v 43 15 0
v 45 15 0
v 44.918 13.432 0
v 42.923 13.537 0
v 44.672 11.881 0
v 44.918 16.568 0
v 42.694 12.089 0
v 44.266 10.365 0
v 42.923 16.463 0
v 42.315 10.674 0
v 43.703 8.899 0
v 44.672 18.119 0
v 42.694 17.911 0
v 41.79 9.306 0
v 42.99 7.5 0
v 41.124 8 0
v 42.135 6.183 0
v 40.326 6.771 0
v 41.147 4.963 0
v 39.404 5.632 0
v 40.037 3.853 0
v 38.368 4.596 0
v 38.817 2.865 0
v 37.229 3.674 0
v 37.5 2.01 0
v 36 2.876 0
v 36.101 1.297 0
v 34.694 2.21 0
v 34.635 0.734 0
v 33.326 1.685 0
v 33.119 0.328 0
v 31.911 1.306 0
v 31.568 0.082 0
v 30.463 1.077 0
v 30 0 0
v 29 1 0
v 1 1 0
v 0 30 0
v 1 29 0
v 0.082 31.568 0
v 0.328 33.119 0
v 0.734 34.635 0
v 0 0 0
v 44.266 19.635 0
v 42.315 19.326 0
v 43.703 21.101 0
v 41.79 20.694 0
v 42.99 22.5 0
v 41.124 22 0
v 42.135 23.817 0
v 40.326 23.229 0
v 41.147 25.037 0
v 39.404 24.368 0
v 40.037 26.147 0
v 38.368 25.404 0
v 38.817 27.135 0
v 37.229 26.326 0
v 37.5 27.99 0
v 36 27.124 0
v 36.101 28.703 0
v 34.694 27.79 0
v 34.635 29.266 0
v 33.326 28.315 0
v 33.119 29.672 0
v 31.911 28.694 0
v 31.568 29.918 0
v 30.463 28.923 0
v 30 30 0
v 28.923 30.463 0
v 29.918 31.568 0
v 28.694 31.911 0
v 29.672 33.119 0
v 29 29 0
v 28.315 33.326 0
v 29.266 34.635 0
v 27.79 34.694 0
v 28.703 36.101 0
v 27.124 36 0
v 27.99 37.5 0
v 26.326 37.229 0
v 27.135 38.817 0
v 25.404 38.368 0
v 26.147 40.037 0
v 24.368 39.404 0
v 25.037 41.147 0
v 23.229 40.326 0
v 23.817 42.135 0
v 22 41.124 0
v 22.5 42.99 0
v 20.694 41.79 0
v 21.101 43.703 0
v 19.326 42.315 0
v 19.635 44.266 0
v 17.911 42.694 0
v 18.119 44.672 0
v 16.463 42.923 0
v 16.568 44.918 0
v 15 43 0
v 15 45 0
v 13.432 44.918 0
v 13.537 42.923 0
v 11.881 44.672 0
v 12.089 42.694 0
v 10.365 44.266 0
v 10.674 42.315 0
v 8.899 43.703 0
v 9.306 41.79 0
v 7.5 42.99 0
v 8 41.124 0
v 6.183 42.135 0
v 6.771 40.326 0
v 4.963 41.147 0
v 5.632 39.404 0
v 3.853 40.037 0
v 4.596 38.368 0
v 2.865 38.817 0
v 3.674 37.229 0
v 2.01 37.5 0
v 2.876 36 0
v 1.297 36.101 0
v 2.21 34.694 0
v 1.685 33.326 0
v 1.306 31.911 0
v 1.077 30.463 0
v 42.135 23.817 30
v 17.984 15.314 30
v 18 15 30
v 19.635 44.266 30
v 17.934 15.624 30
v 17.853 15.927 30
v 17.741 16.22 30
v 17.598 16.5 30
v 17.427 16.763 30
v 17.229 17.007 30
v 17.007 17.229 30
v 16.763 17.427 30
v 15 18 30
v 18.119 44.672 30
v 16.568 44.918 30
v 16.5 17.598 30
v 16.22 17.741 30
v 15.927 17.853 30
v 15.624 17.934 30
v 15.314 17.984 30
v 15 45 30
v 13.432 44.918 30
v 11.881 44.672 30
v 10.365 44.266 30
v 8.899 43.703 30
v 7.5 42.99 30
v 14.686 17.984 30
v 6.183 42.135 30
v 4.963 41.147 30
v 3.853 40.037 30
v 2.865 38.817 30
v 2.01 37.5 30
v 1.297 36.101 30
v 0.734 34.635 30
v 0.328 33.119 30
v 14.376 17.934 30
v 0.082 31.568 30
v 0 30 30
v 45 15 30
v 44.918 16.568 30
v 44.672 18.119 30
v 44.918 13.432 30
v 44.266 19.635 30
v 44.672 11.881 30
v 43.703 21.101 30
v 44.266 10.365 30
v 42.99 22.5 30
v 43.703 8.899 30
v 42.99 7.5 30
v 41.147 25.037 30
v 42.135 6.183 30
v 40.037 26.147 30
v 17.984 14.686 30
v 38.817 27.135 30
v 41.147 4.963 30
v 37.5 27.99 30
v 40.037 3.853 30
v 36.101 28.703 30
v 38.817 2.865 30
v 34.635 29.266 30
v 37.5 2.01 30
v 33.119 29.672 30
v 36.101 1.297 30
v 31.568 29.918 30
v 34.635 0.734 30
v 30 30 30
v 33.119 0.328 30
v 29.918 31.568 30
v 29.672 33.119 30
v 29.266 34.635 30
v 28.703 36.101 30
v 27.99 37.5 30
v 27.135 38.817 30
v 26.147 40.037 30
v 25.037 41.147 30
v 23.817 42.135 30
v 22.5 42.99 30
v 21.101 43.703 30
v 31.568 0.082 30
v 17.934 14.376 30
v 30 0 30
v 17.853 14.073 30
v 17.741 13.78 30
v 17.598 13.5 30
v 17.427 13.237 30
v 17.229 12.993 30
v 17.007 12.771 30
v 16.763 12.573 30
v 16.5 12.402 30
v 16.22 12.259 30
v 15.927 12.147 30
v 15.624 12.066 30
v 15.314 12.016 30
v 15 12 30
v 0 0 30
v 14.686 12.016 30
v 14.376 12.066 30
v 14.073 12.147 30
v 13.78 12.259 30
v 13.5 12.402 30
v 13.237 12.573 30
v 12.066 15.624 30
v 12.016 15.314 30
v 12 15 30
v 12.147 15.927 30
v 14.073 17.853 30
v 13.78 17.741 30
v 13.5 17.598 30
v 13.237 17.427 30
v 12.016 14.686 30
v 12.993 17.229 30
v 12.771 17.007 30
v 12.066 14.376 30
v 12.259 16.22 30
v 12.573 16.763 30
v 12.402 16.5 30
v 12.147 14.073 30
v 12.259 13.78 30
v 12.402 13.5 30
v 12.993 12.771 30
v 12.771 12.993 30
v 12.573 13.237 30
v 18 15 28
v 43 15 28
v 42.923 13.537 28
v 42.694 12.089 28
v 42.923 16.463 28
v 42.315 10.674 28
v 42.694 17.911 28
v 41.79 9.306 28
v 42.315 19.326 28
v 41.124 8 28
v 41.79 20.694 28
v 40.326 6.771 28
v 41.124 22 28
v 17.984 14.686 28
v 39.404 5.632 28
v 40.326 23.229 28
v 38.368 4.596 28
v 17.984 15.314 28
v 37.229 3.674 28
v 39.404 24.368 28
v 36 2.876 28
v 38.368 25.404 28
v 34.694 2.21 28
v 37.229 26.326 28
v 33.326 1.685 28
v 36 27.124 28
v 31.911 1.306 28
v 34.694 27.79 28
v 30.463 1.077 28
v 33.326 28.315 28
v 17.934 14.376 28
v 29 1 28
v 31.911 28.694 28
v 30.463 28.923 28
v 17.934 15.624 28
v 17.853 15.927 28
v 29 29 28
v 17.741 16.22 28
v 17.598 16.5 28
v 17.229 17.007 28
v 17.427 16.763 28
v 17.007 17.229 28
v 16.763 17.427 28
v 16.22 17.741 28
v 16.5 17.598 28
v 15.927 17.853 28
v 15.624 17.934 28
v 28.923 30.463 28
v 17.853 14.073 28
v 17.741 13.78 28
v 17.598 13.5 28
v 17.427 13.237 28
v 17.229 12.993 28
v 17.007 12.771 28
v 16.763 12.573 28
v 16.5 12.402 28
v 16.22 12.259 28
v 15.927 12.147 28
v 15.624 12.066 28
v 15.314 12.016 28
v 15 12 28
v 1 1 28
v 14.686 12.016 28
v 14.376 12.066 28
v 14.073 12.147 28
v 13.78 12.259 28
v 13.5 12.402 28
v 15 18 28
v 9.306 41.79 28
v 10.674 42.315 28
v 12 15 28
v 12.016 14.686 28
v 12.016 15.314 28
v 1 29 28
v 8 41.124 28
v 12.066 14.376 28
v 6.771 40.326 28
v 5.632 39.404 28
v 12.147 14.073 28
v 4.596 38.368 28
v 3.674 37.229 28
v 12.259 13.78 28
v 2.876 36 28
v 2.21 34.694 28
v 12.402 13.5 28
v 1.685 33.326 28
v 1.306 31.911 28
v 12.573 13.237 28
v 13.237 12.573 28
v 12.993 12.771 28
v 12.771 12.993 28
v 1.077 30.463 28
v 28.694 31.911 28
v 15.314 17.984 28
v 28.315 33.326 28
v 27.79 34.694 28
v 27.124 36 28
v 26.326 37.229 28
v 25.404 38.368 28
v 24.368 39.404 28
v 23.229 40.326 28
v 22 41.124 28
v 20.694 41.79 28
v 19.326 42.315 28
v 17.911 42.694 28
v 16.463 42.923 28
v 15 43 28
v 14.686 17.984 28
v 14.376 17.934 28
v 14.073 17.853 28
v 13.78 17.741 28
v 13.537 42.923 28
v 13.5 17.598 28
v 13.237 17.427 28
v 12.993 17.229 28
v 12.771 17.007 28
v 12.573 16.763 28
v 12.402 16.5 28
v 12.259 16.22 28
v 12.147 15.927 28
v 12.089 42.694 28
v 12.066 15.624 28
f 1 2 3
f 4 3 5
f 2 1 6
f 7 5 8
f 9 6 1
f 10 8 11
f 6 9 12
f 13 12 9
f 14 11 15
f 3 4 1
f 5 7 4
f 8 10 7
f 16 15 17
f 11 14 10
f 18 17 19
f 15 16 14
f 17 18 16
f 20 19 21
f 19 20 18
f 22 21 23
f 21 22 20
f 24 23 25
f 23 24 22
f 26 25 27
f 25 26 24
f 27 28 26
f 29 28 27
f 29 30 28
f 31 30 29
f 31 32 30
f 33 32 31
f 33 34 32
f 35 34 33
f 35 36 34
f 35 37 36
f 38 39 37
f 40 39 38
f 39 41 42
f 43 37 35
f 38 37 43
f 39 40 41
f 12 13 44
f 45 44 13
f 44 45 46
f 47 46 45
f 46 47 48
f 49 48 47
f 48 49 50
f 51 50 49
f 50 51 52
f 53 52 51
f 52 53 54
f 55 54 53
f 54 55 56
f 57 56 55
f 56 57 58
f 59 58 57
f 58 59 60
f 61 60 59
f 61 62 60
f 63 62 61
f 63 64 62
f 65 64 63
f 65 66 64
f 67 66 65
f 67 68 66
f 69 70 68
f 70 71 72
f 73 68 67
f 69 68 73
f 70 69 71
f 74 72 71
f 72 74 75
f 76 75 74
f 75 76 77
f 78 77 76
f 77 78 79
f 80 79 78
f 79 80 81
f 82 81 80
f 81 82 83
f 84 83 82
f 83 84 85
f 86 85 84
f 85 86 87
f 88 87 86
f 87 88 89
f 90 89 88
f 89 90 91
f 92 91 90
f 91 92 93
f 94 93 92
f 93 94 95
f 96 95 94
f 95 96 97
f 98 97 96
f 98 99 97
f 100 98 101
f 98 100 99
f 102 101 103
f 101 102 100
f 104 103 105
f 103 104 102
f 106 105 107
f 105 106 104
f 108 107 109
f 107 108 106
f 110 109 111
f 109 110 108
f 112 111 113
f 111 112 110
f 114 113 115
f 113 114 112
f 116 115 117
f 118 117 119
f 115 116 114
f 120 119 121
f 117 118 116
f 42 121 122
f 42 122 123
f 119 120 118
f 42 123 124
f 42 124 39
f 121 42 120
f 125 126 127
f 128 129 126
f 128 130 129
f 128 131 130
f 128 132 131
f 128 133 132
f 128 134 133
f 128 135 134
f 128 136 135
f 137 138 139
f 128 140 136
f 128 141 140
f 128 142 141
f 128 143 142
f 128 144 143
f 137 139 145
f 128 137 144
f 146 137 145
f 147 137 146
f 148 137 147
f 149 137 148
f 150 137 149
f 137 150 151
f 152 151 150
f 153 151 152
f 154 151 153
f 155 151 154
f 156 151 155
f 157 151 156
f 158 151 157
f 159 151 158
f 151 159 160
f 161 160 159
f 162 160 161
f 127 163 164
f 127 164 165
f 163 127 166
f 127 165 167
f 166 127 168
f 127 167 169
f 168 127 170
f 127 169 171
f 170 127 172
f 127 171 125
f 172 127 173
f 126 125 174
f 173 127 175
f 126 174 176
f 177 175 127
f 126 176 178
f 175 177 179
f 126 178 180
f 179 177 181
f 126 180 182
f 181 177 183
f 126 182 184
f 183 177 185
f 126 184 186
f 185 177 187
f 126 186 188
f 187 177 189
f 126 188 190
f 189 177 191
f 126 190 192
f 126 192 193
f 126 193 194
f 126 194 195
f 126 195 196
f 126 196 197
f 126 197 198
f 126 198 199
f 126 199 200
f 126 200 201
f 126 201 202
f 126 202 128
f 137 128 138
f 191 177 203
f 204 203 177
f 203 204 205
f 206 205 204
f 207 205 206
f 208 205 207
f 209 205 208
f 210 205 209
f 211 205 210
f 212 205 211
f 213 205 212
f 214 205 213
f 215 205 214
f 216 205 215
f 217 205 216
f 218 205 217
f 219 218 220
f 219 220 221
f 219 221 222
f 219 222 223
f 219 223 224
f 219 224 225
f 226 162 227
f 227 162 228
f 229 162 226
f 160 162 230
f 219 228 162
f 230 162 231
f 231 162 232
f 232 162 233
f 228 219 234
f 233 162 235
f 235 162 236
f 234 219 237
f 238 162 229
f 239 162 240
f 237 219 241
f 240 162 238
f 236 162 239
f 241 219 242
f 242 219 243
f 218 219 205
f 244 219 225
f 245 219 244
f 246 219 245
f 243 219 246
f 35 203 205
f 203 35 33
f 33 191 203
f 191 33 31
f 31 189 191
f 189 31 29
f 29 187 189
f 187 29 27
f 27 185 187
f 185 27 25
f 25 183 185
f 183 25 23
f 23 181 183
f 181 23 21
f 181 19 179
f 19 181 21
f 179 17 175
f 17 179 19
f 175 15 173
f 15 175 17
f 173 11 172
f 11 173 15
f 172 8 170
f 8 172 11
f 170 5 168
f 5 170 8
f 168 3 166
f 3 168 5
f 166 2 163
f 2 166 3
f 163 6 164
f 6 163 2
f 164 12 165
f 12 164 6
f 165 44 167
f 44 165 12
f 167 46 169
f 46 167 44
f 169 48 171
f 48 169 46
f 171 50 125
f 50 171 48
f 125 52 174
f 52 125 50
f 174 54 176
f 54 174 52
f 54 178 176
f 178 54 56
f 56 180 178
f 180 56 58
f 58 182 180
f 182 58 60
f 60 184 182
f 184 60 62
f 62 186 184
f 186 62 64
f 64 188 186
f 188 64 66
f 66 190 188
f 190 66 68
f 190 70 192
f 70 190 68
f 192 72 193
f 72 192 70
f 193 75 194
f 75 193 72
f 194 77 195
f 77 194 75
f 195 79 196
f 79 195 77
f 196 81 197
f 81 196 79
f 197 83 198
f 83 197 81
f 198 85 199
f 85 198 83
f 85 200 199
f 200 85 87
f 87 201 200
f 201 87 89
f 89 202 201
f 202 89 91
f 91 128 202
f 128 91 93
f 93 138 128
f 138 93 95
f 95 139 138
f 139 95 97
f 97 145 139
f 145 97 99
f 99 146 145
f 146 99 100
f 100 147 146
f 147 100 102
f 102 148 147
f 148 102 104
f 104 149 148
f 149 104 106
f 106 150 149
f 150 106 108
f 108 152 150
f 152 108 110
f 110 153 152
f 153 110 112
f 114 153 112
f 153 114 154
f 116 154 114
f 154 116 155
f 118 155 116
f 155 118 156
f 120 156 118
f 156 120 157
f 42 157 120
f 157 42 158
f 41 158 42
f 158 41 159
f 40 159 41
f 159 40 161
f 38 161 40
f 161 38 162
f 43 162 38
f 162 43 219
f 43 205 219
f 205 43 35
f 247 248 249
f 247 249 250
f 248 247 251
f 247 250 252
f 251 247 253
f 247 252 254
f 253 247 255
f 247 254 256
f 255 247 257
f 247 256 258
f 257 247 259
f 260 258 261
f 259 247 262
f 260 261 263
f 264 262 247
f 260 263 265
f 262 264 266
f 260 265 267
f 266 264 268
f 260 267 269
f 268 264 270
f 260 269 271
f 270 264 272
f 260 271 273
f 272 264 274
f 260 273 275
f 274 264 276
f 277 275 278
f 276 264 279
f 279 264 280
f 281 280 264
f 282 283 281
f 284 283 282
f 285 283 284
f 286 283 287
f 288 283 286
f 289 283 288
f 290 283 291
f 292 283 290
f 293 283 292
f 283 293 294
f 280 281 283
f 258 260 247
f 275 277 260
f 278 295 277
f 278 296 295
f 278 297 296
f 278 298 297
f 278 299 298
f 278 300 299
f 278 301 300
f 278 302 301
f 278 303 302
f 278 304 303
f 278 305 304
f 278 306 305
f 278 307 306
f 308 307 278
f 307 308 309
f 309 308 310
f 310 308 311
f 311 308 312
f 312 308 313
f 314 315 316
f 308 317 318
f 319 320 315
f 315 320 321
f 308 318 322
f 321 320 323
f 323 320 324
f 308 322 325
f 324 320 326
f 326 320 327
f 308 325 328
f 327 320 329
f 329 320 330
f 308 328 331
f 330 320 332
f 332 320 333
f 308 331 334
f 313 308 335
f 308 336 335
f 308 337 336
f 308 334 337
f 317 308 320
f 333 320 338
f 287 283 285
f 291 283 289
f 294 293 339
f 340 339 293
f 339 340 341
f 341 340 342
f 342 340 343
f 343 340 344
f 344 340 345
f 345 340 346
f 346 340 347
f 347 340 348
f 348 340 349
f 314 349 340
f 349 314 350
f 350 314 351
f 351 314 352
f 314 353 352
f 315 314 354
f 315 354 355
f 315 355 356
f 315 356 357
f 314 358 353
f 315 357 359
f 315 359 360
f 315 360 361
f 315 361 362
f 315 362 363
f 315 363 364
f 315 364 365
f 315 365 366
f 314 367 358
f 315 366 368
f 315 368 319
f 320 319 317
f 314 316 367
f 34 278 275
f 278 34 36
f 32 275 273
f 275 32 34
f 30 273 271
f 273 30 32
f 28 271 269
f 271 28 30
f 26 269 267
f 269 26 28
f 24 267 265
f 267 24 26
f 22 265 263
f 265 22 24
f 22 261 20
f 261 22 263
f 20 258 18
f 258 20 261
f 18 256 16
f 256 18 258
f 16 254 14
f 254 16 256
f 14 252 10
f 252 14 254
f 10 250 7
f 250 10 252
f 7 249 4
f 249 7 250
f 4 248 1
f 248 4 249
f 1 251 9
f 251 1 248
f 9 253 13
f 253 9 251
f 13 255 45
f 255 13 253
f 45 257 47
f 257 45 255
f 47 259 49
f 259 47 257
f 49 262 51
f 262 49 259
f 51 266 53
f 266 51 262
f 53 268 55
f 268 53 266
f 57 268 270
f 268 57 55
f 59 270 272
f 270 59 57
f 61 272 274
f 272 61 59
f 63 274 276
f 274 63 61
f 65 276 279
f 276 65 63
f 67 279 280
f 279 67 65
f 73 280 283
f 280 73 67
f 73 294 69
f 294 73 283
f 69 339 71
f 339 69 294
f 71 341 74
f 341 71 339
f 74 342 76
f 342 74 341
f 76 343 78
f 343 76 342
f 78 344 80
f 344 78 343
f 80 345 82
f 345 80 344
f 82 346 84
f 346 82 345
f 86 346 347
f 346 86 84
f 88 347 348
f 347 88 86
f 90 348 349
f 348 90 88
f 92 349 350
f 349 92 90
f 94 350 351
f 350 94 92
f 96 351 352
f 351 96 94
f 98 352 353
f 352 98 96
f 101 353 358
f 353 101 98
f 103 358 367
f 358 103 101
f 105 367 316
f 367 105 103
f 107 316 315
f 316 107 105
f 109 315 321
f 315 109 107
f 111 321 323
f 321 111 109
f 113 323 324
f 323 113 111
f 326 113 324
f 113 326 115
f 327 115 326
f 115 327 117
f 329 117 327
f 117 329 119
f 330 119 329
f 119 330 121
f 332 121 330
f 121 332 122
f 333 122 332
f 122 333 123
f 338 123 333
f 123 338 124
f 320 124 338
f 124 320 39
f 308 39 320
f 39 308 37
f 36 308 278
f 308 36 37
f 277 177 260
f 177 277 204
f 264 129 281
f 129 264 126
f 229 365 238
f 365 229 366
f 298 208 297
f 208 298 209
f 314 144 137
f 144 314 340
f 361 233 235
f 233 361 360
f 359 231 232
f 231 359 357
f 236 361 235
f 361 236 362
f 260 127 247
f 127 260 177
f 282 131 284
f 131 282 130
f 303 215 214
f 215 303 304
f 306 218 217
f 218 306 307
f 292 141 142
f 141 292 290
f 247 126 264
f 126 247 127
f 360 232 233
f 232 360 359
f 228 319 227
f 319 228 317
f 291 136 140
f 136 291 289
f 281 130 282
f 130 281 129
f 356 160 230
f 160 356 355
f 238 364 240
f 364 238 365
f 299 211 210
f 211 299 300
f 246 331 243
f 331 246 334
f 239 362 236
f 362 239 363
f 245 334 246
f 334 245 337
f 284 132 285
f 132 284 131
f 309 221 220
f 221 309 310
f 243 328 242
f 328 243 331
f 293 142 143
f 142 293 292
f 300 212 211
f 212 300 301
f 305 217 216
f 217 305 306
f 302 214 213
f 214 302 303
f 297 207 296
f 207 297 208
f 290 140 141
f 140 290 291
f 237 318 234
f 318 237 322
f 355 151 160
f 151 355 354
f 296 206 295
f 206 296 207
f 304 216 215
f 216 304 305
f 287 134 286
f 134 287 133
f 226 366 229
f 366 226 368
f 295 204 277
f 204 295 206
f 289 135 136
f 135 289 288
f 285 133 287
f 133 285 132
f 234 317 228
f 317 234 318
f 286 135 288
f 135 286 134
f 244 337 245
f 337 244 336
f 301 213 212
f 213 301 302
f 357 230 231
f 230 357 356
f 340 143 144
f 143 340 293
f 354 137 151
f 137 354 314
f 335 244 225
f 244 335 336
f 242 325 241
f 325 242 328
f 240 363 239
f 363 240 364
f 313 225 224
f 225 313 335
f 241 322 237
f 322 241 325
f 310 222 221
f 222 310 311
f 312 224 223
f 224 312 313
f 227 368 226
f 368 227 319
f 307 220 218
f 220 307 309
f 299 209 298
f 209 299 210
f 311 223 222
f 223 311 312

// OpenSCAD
$fn=60;
h_height=30;
hc_height=10;
h_size = 30;
t = 2;
support_r=3;
support_h=3;
planter = 1;

module flat_heart( h, s) {
  square(s);

  translate([s/2, s, 0])
  circle(s/2);

  translate([s, s/2, 0])
  circle(s/2);
}

module heart( h, s){
    difference()
    {
        linear_extrude(height=h) flat_heart( h, s);
        linear_extrude(height=h-t) translate( [ t/2, t/2, 0]) flat_heart( h-t, s-t);
    }
}

module cover( with_feet){
    // cover
    union(){
    rotate([180, 0, 90]) translate( [-t, -t, -hc_height]) heart( hc_height, h_size+t*2);
    if ( with_feet == 1){
        // feets
        translate([h_size/2, h_size/4, -2+support_h]) cylinder( r=support_r, h=support_h);
        translate([h_size, h_size/4, -2+support_h]) cylinder( r=support_r, h=support_h);
        rotate([0, 0, 90]){
            translate([h_size/2, -h_size/4, -2+support_h]) cylinder( r=support_r, h=support_h);
            translate([h_size, -h_size/4, -2+support_h]) cylinder( r=support_r, h=support_h);
        }
        rotate([0, 0, 20]) translate([h_size, h_size/2, -2+support_h]) cylinder( r=support_r, h=support_h);
        }
    }
}
module heart_planter( with_planter){
    difference(){
        heart( h_height, h_size);
        if ( with_planter == 1)
            translate([h_size/2, h_size/2, -2+support_h]) cylinder( r=3, h=100);    
    }
}

heart_planter( planter);
//cover( planter);
